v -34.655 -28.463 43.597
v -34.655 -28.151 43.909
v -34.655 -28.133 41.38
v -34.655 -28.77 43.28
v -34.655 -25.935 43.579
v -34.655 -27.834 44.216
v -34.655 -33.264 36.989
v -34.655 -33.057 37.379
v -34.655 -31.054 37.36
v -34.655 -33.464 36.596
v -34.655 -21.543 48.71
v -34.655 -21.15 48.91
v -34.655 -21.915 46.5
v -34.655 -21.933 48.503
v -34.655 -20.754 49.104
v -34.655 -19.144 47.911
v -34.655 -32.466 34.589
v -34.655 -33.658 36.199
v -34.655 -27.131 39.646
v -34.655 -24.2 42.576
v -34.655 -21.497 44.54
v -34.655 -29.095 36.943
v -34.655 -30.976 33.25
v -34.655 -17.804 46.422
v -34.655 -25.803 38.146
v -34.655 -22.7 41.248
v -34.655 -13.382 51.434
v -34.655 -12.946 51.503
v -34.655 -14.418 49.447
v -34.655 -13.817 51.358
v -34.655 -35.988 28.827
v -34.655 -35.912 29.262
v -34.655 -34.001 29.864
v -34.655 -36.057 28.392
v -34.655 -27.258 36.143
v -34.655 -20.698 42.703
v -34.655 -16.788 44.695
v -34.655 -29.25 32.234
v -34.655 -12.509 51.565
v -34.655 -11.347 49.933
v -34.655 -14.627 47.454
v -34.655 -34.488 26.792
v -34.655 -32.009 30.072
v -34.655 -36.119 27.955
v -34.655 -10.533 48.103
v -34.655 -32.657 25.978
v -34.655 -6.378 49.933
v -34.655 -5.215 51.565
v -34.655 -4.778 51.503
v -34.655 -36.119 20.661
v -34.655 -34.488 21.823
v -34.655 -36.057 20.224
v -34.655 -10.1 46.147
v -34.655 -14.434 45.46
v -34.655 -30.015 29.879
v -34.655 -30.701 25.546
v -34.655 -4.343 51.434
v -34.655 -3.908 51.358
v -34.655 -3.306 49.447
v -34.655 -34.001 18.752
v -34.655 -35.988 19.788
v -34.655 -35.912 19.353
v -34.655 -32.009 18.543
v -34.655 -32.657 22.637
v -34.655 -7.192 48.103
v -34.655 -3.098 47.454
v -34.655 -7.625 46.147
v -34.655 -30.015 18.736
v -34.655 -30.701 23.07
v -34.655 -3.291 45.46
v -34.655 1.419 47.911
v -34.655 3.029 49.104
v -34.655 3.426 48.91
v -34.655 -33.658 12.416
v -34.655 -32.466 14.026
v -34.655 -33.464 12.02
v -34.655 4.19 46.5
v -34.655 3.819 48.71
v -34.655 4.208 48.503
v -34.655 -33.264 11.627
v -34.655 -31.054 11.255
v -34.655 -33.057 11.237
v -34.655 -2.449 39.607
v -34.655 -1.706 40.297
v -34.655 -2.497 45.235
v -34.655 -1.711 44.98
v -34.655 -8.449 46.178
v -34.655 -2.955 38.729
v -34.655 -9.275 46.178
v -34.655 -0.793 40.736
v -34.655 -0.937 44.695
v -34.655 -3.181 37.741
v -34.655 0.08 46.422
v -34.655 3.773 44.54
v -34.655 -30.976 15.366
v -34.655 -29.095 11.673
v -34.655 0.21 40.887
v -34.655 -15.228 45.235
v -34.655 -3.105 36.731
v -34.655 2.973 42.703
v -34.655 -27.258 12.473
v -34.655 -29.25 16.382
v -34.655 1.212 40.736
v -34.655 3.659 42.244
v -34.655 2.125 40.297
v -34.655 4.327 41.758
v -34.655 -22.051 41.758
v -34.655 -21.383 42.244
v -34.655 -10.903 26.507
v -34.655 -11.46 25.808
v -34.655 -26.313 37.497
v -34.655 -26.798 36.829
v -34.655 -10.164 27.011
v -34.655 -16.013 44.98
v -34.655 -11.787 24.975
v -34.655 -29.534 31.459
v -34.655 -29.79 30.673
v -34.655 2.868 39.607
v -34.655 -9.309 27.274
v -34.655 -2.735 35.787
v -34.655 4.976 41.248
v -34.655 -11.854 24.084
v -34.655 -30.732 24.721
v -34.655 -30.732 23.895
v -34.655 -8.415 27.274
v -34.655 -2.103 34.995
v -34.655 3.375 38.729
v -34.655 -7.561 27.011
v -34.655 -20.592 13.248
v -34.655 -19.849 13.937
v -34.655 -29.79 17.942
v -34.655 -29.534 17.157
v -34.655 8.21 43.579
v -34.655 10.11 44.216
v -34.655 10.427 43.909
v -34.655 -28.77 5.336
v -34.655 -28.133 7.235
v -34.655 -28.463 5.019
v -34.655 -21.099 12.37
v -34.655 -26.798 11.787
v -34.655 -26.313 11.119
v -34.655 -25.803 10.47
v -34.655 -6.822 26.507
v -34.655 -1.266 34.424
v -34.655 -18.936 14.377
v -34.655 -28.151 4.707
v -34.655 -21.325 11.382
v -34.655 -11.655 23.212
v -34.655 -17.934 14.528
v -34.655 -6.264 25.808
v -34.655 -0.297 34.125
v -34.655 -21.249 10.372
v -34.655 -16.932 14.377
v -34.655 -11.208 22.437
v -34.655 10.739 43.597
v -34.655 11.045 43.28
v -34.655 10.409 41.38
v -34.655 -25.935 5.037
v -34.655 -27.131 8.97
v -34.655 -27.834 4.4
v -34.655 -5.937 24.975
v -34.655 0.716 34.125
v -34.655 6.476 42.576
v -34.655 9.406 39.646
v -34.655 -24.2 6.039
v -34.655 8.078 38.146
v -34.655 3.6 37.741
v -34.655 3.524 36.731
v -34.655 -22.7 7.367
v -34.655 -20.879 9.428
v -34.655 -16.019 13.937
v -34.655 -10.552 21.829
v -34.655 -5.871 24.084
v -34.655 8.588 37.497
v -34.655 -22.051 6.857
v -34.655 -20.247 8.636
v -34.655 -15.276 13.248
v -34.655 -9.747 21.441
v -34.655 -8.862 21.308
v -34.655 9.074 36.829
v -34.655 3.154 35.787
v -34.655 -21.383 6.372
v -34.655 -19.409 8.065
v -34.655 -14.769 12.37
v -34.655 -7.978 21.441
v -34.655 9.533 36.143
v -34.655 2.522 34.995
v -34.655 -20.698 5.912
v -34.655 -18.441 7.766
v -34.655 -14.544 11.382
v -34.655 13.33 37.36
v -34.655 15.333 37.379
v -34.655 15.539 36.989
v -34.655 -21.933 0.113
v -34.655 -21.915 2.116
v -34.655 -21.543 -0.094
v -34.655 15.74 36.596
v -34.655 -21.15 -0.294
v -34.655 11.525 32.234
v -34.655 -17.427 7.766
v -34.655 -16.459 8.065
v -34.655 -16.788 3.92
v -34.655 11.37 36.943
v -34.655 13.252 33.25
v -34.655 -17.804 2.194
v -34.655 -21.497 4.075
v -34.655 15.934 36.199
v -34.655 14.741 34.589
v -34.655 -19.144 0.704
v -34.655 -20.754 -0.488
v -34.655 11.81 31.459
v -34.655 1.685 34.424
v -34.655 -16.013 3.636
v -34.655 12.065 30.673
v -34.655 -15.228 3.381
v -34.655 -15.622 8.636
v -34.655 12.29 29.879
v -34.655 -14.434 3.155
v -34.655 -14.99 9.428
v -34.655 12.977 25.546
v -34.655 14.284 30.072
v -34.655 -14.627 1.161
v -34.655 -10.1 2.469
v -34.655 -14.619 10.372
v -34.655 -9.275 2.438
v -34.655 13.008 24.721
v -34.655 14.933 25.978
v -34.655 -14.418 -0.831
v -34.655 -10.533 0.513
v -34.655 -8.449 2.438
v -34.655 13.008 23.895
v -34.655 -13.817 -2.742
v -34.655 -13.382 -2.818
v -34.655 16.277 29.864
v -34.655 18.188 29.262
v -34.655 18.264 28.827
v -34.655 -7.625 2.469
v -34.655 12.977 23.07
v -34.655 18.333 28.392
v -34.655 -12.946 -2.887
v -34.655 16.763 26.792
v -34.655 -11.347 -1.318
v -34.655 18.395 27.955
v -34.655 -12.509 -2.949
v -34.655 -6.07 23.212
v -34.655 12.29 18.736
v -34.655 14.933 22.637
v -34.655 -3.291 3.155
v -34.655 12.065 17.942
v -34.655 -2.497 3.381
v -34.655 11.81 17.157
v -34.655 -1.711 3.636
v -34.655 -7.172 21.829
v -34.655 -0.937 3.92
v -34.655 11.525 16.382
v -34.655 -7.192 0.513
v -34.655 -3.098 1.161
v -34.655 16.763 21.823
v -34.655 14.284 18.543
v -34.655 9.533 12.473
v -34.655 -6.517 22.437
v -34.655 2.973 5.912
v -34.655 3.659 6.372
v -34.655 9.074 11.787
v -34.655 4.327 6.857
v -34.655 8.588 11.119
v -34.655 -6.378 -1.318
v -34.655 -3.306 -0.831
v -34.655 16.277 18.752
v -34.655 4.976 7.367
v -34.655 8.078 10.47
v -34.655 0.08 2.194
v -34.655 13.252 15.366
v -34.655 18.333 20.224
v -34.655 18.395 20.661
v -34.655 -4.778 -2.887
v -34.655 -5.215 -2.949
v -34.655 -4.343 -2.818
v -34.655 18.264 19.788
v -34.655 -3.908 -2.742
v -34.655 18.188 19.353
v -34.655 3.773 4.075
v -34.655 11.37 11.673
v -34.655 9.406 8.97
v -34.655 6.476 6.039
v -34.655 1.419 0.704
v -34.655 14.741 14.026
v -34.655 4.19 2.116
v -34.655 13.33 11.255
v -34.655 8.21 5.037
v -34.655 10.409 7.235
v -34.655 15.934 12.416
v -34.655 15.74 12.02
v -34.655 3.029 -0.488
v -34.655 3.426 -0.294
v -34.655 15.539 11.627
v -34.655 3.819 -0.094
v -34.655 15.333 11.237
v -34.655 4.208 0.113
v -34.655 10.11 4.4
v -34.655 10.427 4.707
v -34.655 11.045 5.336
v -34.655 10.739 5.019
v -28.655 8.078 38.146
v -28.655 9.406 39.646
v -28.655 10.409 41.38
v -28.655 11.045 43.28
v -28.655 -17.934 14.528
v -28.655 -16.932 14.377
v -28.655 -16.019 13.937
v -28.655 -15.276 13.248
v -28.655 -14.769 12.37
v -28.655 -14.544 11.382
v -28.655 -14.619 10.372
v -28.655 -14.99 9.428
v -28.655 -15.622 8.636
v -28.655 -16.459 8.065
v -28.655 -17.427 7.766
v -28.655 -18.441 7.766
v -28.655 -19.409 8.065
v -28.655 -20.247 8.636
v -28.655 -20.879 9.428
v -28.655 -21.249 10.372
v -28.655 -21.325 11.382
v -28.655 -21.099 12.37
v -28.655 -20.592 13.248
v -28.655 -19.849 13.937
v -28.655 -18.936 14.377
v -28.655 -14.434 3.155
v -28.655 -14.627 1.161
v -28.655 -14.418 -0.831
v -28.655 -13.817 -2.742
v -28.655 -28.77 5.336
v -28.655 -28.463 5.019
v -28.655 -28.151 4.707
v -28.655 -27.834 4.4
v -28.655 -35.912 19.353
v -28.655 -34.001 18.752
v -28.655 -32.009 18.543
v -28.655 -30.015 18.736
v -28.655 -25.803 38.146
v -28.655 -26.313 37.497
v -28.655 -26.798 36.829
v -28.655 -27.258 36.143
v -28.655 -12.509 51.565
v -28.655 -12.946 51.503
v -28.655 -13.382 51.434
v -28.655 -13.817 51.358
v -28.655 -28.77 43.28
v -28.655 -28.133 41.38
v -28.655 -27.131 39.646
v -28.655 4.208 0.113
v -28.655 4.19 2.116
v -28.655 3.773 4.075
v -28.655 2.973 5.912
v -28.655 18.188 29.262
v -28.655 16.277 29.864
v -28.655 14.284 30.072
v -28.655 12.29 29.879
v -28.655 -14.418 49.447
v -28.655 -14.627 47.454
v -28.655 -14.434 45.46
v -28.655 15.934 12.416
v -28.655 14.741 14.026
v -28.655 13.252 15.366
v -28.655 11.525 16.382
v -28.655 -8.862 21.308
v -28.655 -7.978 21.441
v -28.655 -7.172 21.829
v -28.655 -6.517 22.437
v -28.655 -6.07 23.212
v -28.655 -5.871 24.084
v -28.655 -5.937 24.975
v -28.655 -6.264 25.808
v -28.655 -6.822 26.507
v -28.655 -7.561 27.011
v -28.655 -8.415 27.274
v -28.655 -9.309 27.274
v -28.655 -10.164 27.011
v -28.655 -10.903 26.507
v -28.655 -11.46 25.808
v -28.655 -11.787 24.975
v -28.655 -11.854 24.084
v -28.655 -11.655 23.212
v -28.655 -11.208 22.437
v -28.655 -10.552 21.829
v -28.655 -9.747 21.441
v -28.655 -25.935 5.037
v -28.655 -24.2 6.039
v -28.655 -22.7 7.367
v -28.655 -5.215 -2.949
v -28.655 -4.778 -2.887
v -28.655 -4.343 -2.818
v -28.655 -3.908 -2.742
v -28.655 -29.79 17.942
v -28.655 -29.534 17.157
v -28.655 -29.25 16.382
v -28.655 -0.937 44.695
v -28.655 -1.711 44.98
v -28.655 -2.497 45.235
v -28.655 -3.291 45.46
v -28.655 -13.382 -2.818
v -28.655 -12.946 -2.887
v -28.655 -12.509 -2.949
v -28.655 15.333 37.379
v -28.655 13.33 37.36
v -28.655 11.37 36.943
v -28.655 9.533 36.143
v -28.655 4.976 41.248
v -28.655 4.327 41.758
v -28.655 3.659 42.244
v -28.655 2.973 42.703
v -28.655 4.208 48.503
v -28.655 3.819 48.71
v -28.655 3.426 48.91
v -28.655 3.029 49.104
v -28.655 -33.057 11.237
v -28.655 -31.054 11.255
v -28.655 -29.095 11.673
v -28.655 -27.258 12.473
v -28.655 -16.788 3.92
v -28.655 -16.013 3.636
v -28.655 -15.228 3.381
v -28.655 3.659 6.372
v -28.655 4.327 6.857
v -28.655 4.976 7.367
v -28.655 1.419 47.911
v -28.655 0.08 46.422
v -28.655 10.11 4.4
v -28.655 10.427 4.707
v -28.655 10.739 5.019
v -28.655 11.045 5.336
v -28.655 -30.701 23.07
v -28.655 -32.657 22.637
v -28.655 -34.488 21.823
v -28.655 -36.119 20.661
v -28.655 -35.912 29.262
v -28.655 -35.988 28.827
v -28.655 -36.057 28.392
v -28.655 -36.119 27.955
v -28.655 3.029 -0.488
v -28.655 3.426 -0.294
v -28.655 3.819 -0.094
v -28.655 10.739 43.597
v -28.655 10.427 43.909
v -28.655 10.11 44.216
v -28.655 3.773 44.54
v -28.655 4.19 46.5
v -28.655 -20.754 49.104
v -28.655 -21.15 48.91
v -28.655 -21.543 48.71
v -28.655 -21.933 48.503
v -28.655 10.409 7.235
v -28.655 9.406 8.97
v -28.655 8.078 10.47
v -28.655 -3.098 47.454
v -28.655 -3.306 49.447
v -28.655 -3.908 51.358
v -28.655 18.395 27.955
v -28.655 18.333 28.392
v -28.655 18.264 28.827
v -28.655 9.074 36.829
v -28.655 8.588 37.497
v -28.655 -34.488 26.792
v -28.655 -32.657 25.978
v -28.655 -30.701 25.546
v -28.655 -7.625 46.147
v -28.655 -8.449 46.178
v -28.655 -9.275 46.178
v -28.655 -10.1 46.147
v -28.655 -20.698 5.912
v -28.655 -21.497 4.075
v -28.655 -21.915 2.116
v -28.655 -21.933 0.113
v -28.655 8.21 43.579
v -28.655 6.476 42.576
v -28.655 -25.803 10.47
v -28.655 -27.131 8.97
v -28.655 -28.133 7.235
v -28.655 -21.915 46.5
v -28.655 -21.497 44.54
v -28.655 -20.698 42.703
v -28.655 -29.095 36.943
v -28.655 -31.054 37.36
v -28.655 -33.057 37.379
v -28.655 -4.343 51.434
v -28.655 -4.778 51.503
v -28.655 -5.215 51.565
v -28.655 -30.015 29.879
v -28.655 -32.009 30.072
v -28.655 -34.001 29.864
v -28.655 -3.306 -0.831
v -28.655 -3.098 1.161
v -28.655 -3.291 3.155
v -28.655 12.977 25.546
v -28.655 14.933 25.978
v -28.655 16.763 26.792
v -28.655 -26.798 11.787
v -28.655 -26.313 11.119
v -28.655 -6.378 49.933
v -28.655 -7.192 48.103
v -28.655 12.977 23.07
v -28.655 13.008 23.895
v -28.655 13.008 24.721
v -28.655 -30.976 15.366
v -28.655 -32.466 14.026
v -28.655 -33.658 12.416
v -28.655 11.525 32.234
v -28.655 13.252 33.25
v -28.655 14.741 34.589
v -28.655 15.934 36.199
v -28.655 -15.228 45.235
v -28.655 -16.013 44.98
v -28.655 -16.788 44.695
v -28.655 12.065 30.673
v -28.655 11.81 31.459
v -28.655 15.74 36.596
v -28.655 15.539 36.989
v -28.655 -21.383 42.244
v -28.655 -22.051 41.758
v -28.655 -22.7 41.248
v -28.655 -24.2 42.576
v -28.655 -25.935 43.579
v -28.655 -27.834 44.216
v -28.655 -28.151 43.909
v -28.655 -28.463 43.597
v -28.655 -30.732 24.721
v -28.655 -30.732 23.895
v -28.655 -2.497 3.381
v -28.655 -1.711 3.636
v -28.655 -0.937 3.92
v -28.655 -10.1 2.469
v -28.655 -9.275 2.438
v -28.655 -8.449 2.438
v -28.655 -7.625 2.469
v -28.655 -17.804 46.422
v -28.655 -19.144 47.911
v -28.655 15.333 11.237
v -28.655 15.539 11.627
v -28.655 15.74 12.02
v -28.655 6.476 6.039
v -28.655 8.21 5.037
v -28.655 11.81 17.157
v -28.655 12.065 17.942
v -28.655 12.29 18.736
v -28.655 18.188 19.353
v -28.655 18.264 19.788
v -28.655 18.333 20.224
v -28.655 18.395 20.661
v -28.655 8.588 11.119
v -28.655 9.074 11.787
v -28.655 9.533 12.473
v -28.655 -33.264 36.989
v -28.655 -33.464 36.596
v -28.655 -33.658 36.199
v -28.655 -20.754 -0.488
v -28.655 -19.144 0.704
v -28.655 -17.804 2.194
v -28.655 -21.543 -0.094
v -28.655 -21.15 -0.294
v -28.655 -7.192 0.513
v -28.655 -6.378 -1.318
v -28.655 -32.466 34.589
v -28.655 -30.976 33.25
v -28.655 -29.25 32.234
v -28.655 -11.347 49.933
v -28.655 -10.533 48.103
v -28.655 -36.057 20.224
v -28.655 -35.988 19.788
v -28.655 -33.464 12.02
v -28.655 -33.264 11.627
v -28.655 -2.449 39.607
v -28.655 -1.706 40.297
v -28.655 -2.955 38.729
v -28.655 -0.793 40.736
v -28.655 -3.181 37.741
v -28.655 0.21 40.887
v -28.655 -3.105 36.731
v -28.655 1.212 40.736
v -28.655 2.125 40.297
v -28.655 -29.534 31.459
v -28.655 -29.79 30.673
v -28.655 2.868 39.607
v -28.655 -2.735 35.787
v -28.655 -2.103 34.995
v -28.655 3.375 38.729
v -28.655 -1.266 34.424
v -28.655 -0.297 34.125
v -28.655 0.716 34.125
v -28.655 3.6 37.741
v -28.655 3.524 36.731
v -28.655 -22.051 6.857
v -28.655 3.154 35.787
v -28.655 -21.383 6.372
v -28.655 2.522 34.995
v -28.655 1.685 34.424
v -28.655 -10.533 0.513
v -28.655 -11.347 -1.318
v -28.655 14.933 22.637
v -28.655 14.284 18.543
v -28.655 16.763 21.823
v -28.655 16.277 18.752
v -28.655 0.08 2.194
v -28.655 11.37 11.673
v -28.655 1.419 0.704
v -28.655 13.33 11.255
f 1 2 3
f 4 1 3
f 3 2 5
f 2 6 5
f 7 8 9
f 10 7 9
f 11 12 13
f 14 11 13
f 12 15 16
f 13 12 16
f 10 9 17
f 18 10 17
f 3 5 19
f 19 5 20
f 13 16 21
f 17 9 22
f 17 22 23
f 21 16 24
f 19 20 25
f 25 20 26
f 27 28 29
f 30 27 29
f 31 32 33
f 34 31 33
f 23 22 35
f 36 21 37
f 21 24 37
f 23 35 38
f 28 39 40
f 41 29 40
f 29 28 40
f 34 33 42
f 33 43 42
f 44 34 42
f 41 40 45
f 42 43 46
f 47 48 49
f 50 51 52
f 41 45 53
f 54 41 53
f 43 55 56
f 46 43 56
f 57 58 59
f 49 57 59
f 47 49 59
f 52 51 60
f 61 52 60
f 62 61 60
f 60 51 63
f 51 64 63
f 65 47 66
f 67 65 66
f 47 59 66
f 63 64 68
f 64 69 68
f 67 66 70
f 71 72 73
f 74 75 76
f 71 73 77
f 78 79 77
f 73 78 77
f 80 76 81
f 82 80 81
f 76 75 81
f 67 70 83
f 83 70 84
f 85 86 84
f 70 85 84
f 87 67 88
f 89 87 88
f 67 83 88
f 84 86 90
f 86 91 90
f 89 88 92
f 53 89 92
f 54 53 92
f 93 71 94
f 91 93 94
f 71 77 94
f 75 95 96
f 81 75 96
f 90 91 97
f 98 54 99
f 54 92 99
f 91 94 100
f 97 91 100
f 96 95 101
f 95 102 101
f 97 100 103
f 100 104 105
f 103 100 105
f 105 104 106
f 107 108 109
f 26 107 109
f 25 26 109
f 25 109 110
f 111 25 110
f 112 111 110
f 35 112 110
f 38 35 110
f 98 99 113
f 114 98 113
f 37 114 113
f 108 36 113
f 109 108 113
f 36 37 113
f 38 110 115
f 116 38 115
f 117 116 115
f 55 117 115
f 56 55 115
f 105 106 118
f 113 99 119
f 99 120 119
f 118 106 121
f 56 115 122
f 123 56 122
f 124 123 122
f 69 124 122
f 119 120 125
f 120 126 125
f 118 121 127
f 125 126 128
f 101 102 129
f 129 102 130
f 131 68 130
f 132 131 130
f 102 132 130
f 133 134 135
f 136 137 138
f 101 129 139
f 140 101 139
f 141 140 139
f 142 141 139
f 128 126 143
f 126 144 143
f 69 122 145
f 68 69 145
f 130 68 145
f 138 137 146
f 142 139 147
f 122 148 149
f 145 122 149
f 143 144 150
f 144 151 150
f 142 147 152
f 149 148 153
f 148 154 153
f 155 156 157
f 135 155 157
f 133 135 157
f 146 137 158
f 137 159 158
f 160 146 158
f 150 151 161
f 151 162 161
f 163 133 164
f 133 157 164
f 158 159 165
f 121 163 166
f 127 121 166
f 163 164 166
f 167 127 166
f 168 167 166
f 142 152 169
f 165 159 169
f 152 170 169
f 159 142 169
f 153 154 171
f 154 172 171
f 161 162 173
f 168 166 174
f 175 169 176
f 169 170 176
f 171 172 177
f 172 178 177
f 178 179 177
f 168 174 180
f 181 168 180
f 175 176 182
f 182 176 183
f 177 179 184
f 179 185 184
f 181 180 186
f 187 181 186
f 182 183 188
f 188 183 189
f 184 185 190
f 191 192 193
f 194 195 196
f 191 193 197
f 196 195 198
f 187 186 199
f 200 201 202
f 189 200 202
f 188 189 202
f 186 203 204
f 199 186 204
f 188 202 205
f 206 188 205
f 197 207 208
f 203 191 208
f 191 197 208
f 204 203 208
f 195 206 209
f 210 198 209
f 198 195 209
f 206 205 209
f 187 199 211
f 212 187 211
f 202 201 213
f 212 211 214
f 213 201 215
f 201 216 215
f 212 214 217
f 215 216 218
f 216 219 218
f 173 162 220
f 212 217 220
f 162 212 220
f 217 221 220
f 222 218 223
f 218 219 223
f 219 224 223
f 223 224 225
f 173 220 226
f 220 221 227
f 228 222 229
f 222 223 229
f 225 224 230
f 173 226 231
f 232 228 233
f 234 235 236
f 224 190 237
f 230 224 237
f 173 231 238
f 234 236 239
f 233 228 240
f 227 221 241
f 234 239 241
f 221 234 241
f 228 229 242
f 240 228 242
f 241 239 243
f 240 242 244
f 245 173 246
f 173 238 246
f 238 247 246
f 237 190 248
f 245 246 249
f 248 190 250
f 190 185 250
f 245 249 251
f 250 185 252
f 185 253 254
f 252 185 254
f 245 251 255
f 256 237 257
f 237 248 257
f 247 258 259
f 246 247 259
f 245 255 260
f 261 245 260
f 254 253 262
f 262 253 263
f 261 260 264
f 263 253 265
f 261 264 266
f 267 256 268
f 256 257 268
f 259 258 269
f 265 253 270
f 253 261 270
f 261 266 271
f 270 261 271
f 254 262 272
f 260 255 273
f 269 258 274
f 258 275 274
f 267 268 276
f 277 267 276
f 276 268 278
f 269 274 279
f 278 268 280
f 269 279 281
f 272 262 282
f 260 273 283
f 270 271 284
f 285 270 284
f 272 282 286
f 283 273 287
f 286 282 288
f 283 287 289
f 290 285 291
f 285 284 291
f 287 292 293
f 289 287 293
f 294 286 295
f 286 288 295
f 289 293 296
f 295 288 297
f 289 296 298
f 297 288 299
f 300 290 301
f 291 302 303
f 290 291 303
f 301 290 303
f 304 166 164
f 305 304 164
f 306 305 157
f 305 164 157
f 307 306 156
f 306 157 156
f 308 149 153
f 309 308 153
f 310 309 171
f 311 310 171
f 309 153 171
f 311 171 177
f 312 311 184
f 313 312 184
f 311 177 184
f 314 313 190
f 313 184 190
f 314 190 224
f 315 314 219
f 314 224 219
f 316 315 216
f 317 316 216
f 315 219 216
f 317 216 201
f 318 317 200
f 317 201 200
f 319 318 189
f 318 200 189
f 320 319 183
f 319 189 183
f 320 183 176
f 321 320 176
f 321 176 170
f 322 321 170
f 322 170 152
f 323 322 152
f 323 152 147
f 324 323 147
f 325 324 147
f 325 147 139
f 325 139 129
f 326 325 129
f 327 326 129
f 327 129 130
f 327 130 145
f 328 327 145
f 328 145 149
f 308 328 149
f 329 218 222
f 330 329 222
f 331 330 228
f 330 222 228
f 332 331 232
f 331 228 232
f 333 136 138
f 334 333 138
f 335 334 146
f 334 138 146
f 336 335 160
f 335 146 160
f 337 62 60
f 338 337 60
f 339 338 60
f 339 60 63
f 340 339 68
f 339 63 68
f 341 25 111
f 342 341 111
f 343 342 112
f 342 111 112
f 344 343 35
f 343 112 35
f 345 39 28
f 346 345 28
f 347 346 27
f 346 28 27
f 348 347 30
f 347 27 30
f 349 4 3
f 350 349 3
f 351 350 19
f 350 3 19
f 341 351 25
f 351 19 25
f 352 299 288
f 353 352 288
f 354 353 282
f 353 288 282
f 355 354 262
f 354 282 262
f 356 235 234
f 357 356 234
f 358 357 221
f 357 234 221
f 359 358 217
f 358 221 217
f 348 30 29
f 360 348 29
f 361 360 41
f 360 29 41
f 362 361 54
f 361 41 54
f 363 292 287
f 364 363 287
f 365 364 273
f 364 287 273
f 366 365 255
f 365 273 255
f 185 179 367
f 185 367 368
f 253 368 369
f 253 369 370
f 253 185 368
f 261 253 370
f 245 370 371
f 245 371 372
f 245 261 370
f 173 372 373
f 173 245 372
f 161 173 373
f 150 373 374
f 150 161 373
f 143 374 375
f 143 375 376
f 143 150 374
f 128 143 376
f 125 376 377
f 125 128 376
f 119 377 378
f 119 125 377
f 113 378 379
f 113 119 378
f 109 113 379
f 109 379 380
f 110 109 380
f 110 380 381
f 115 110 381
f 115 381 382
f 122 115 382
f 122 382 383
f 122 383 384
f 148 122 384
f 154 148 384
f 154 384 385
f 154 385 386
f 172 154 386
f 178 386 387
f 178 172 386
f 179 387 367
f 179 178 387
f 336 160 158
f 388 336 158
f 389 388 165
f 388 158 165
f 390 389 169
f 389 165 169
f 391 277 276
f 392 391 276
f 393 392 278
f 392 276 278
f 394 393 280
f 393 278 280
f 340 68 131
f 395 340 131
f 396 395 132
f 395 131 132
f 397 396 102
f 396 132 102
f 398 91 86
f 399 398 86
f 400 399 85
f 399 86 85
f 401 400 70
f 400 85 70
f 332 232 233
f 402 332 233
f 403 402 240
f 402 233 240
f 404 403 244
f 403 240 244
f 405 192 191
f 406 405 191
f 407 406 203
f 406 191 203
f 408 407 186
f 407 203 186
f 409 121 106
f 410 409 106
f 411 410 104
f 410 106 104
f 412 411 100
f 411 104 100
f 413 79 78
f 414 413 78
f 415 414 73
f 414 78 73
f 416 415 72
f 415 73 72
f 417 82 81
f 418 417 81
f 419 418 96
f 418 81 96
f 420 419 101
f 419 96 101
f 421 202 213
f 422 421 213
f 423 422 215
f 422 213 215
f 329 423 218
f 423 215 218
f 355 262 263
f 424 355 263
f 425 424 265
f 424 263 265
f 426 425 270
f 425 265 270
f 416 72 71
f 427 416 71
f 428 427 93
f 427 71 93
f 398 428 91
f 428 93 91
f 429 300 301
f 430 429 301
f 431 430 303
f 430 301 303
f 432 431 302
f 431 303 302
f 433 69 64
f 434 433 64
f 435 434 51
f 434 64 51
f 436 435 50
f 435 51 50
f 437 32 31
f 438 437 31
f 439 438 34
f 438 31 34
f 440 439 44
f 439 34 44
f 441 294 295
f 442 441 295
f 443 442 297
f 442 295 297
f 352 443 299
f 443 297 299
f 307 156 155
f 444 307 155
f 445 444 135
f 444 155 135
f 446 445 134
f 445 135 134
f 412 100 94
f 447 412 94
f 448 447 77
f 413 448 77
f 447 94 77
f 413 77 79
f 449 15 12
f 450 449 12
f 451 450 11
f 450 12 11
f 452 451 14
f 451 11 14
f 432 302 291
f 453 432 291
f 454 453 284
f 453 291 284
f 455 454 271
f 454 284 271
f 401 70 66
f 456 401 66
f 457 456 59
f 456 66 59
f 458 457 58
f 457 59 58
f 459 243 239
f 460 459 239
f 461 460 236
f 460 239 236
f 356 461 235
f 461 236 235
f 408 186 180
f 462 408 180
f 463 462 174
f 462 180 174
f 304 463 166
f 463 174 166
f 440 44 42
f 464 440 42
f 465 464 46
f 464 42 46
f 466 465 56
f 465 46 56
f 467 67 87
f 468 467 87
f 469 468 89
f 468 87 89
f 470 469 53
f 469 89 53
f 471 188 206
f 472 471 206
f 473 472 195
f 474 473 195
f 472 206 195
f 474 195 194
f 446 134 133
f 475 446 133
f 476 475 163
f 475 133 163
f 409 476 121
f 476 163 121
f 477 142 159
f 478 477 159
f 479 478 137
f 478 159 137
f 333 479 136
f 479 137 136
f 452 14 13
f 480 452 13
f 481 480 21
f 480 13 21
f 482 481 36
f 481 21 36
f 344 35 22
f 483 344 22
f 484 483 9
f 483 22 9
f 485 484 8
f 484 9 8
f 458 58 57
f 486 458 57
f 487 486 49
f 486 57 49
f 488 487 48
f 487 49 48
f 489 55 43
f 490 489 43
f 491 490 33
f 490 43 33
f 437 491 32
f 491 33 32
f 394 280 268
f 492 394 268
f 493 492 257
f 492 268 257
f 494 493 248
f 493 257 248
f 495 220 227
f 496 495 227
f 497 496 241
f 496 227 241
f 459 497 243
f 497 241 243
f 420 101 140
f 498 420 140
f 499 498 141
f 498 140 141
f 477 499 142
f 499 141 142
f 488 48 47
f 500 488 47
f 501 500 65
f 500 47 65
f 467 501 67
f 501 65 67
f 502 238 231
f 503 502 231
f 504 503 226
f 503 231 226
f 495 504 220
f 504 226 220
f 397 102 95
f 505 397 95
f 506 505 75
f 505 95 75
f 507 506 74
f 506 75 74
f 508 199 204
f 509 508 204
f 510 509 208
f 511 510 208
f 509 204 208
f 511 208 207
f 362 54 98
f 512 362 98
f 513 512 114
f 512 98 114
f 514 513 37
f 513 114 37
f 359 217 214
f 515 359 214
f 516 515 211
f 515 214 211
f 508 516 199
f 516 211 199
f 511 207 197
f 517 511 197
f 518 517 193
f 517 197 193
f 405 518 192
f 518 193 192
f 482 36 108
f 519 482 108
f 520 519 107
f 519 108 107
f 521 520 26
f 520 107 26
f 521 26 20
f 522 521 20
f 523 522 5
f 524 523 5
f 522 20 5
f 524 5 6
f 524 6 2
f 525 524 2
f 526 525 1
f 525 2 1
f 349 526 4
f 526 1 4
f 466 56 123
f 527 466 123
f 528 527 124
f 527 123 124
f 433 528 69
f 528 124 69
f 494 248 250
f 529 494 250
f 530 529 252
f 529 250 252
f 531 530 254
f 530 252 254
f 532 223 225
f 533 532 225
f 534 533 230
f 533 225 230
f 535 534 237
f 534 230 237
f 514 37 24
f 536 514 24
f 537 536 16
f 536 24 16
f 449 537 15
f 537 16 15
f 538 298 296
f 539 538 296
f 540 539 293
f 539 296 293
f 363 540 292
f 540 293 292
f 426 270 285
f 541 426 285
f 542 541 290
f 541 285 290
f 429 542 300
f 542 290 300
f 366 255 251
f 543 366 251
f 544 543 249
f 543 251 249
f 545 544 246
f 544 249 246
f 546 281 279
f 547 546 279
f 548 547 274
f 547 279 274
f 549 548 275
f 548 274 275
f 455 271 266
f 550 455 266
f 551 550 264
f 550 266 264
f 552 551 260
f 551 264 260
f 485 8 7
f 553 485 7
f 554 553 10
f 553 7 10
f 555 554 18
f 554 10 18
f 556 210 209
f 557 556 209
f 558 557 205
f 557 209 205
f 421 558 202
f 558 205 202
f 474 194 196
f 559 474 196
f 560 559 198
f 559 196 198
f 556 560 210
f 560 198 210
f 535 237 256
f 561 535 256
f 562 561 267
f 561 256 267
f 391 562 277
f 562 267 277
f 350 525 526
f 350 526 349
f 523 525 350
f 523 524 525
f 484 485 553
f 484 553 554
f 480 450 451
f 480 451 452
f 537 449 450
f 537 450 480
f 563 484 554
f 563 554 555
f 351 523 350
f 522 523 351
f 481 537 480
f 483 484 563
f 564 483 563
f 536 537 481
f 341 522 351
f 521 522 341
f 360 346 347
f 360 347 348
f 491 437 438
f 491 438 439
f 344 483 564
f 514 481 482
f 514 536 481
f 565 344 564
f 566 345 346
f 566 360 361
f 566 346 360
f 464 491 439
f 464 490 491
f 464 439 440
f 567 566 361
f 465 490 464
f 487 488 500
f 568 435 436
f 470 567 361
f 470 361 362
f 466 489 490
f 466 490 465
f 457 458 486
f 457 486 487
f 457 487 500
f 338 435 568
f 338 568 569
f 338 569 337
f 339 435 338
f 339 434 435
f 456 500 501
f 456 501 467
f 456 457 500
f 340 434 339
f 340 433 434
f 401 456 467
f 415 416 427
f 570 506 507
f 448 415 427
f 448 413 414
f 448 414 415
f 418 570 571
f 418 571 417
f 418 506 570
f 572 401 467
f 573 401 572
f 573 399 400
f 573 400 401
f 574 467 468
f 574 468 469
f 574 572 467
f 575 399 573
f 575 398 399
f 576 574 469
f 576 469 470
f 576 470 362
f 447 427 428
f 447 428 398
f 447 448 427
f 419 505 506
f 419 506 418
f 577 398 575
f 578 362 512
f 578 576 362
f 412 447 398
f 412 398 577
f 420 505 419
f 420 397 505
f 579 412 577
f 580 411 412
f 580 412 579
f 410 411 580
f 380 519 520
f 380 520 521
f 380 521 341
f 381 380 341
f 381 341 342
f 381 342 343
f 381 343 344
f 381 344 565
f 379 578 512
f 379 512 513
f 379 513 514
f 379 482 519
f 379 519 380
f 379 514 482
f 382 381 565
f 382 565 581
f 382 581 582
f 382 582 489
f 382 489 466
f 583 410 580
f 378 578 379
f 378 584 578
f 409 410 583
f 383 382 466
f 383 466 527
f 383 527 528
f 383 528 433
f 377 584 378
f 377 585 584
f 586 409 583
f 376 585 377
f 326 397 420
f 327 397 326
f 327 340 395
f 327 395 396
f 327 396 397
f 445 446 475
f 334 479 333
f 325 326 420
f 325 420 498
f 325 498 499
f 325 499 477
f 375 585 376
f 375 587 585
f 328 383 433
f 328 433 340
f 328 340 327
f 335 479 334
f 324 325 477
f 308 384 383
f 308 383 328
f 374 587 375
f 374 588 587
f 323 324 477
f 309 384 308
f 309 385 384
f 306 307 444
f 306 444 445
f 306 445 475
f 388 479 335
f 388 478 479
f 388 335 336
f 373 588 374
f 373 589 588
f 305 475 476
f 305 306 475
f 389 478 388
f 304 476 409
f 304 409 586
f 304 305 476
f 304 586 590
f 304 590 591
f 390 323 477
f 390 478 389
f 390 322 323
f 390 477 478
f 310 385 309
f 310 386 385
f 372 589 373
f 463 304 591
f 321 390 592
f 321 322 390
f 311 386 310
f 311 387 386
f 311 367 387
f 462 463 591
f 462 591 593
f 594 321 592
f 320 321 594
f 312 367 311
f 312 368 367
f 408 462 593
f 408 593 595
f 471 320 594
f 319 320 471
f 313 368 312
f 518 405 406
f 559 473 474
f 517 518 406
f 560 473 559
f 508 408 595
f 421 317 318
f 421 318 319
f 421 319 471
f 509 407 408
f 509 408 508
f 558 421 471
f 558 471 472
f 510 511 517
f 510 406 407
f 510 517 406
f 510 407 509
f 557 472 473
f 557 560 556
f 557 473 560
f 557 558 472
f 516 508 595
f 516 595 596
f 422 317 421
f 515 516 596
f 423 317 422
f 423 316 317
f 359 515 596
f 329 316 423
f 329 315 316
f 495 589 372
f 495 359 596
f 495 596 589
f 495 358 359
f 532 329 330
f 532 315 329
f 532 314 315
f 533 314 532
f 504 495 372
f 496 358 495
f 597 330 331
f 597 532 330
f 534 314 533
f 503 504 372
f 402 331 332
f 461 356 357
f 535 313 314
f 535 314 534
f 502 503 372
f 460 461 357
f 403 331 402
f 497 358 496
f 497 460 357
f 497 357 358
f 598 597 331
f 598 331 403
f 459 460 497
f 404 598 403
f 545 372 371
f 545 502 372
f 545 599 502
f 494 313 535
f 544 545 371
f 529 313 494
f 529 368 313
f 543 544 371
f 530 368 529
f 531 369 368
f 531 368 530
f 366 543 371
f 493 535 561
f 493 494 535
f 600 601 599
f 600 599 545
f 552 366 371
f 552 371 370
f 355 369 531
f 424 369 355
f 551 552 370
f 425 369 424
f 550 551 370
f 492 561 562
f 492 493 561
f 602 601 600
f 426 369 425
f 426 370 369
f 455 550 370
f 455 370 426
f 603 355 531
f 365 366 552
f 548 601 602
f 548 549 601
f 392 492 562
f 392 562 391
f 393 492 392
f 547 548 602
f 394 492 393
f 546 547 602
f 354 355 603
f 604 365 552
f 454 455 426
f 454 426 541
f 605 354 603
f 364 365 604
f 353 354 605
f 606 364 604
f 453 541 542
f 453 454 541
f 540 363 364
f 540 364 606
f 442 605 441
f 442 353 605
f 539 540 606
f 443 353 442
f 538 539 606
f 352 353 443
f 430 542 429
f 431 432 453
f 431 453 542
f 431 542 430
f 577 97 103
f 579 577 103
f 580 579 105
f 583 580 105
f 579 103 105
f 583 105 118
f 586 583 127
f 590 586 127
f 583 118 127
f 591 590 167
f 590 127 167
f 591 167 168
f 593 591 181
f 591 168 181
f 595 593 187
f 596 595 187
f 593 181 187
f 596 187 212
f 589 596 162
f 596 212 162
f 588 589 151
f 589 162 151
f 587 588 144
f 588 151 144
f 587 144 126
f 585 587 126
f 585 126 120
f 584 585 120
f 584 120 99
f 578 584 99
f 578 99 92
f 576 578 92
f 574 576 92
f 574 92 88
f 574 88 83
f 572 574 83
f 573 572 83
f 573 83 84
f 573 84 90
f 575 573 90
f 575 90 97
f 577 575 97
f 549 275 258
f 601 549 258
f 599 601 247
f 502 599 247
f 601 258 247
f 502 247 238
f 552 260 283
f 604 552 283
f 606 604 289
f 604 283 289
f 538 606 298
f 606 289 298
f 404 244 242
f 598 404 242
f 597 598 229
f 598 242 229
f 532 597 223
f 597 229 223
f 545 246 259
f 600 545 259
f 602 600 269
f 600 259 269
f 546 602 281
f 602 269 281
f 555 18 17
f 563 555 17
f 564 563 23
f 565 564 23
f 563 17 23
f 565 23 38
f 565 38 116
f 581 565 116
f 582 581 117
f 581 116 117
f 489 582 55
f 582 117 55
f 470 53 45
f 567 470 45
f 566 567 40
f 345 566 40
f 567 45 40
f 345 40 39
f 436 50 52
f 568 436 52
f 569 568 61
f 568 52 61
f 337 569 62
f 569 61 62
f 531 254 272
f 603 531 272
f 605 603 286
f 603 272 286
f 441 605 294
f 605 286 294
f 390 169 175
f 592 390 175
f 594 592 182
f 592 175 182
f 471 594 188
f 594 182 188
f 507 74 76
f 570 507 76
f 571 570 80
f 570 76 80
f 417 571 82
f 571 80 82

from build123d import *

# Parameters (mm, degrees)
SPUR_START             = -34.654843931
SPUR_GEAR_AM_OUTLINE_R = 5
SPUR_GEAR_AM_DEPTH     = 6
BOSS_EXTRUDE1_START    = -6
SKETCH2_R              = 5
SKETCH2_R_2            = 3
BOSS_EXTRUDE1_DEPTH    = 6
CUT_EXTRUDE1_REACH     = 65.242
SKETCH3_R              = 3.4


# Read off the part's stored shape, not the designer's step: spur gear_am
with BuildPart() as part:
    # spur gear_am outline → spur gear_am (new body)
    with BuildSketch(Plane.YZ.offset(SPUR_START)):
        with BuildLine():
            ThreePointArc((-3.907949552, 51.357822977), (-4.560317936, 51.46921073), (-5.215177847, 51.564867598))
            ThreePointArc((-5.215177847, 51.564867598), (-6.830693003, 49.038493172), (-7.624540457, 46.146735372))
            ThreePointArc((-7.624540457, 46.146735372), (-8.862265725, 46.181781364), (-10.099990992, 46.146735372))
            ThreePointArc((-10.099990992, 46.146735372), (-10.893838446, 49.038493172), (-12.509353602, 51.564867598))
            ThreePointArc((-12.509353602, 51.564867598), (-13.164213513, 51.46921073), (-13.816581897, 51.357822977))
            ThreePointArc((-13.816581897, 51.357822977), (-14.572335481, 48.455876478), (-14.433726972, 45.460339024))
            ThreePointArc((-14.433726972, 45.460339024), (-15.62170346, 45.111191601), (-16.788020333, 44.69538274))
            ThreePointArc((-16.788020333, 44.69538274), (-18.436616432, 47.200295486), (-20.75375528, 49.103798708))
            ThreePointArc((-20.75375528, 49.103798708), (-21.347004468, 48.810460779), (-21.933022961, 48.502931813))
            ThreePointArc((-21.933022961, 48.502931813), (-21.755036547, 45.509475985), (-20.69754004, 42.703382954))
            ThreePointArc((-20.69754004, 42.703382954), (-21.719480333, 42.004219099), (-22.700221591, 41.248349637))
            ThreePointArc((-22.700221591, 41.248349637), (-25.042190262, 43.121219015), (-27.834135107, 44.215522876))
            ThreePointArc((-27.834135107, 44.215522876), (-28.307702207, 43.753217846), (-28.770007237, 43.279650746))
            ThreePointArc((-28.770007237, 43.279650746), (-27.675703376, 40.487705901), (-25.802833998, 38.145737231))
            ThreePointArc((-25.802833998, 38.145737231), (-26.558703459, 37.164995972), (-27.257867315, 36.143055679))
            ThreePointArc((-27.257867315, 36.143055679), (-30.063960346, 37.200552186), (-33.057416174, 37.3785386))
            ThreePointArc((-33.057416174, 37.3785386), (-33.36494514, 36.792520107), (-33.658283069, 36.199270919))
            ThreePointArc((-33.658283069, 36.199270919), (-31.754779846, 33.882132071), (-29.249867101, 32.233535972))
            ThreePointArc((-29.249867101, 32.233535972), (-29.665675962, 31.067219099), (-30.014823385, 29.879242611))
            ThreePointArc((-30.014823385, 29.879242611), (-33.010360839, 30.01785112), (-35.912307338, 29.262097536))
            ThreePointArc((-35.912307338, 29.262097536), (-36.023695091, 28.609729152), (-36.119351959, 27.954869241))
            ThreePointArc((-36.119351959, 27.954869241), (-33.592977533, 26.339354085), (-30.701219732, 25.545506631))
            ThreePointArc((-30.701219732, 25.545506631), (-30.736265724, 24.307781363), (-30.701219732, 23.070056096))
            ThreePointArc((-30.701219732, 23.070056096), (-33.592977533, 22.276208642), (-36.119351959, 20.660693486))
            ThreePointArc((-36.119351959, 20.660693486), (-36.023695091, 20.005833575), (-35.912307338, 19.353465191))
            ThreePointArc((-35.912307338, 19.353465191), (-33.010360839, 18.597711607), (-30.014823385, 18.736320117))
            ThreePointArc((-30.014823385, 18.736320117), (-29.665675962, 17.548343629), (-29.249867101, 16.382026755))
            ThreePointArc((-29.249867101, 16.382026755), (-31.754779846, 14.733430656), (-33.658283069, 12.416291808))
            ThreePointArc((-33.658283069, 12.416291808), (-33.36494514, 11.82304262), (-33.057416174, 11.237024127))
            ThreePointArc((-33.057416174, 11.237024127), (-30.063960346, 11.415010541), (-27.257867315, 12.472507048))
            ThreePointArc((-27.257867315, 12.472507048), (-26.558703459, 11.450566755), (-25.802833998, 10.469825497))
            ThreePointArc((-25.802833998, 10.469825497), (-27.675703376, 8.127856826), (-28.770007237, 5.335911981))
            ThreePointArc((-28.770007237, 5.335911981), (-28.307702207, 4.862344881), (-27.834135107, 4.400039851))
            ThreePointArc((-27.834135107, 4.400039851), (-25.042190262, 5.494343712), (-22.700221591, 7.36721309))
            ThreePointArc((-22.700221591, 7.36721309), (-21.719480333, 6.611343629), (-20.69754004, 5.912179773))
            ThreePointArc((-20.69754004, 5.912179773), (-21.755036547, 3.106086742), (-21.933022961, 0.112630914))
            ThreePointArc((-21.933022961, 0.112630914), (-21.347004468, -0.194898052), (-20.75375528, -0.488235981))
            ThreePointArc((-20.75375528, -0.488235981), (-18.436616432, 1.415267242), (-16.788020333, 3.920179987))
            ThreePointArc((-16.788020333, 3.920179987), (-15.62170346, 3.504371126), (-14.433726972, 3.155223703))
            ThreePointArc((-14.433726972, 3.155223703), (-14.572335481, 0.159686249), (-13.816581897, -2.742260249))
            ThreePointArc((-13.816581897, -2.742260249), (-13.164213513, -2.853648003), (-12.509353602, -2.949304871))
            ThreePointArc((-12.509353602, -2.949304871), (-10.893838446, -0.422930445), (-10.099990992, 2.468827356))
            ThreePointArc((-10.099990992, 2.468827356), (-8.862265725, 2.433781364), (-7.624540457, 2.468827356))
            ThreePointArc((-7.624540457, 2.468827356), (-6.830693003, -0.422930445), (-5.215177847, -2.949304871))
            ThreePointArc((-5.215177847, -2.949304871), (-4.560317936, -2.853648003), (-3.907949552, -2.742260249))
            ThreePointArc((-3.907949552, -2.742260249), (-3.152195968, 0.159686249), (-3.290804477, 3.155223703))
            ThreePointArc((-3.290804477, 3.155223703), (-2.102827989, 3.504371126), (-0.936511116, 3.920179987))
            ThreePointArc((-0.936511116, 3.920179987), (0.712084983, 1.415267242), (3.029223831, -0.488235981))
            ThreePointArc((3.029223831, -0.488235981), (3.622473019, -0.194898052), (4.208491512, 0.112630914))
            ThreePointArc((4.208491512, 0.112630914), (4.030505098, 3.106086742), (2.973008591, 5.912179773))
            ThreePointArc((2.973008591, 5.912179773), (3.994948884, 6.611343629), (4.975690142, 7.36721309))
            ThreePointArc((4.975690142, 7.36721309), (7.317658813, 5.494343712), (10.109603658, 4.400039851))
            ThreePointArc((10.109603658, 4.400039851), (10.583170758, 4.862344881), (11.045475788, 5.335911981))
            ThreePointArc((11.045475788, 5.335911981), (9.951171927, 8.127856826), (8.078302549, 10.469825497))
            ThreePointArc((8.078302549, 10.469825497), (8.83417201, 11.450566755), (9.533335866, 12.472507048))
            ThreePointArc((9.533335866, 12.472507048), (12.339428897, 11.415010541), (15.332884725, 11.237024127))
            ThreePointArc((15.332884725, 11.237024127), (15.640413691, 11.82304262), (15.93375162, 12.416291808))
            ThreePointArc((15.93375162, 12.416291808), (14.030248397, 14.733430656), (11.525335652, 16.382026755))
            ThreePointArc((11.525335652, 16.382026755), (11.941144513, 17.548343629), (12.290291936, 18.736320117))
            ThreePointArc((12.290291936, 18.736320117), (15.28582939, 18.597711607), (18.187775889, 19.353465191))
            ThreePointArc((18.187775889, 19.353465191), (18.299163642, 20.005833575), (18.39482051, 20.660693486))
            ThreePointArc((18.39482051, 20.660693486), (15.868446084, 22.276208642), (12.976688283, 23.070056096))
            ThreePointArc((12.976688283, 23.070056096), (13.011734276, 24.307781363), (12.976688283, 25.545506631))
            ThreePointArc((12.976688283, 25.545506631), (15.868446084, 26.339354085), (18.39482051, 27.954869241))
            ThreePointArc((18.39482051, 27.954869241), (18.299163642, 28.609729152), (18.187775889, 29.262097536))
            ThreePointArc((18.187775889, 29.262097536), (15.28582939, 30.01785112), (12.290291936, 29.879242611))
            ThreePointArc((12.290291936, 29.879242611), (11.941144513, 31.067219099), (11.525335652, 32.233535972))
            ThreePointArc((11.525335652, 32.233535972), (14.030248397, 33.882132071), (15.93375162, 36.199270919))
            ThreePointArc((15.93375162, 36.199270919), (15.640413691, 36.792520107), (15.332884725, 37.3785386))
            ThreePointArc((15.332884725, 37.3785386), (12.339428897, 37.200552186), (9.533335866, 36.143055679))
            ThreePointArc((9.533335866, 36.143055679), (8.83417201, 37.164995972), (8.078302549, 38.145737231))
            ThreePointArc((8.078302549, 38.145737231), (9.951171927, 40.487705901), (11.045475788, 43.279650746))
            ThreePointArc((11.045475788, 43.279650746), (10.583170758, 43.753217846), (10.109603658, 44.215522876))
            ThreePointArc((10.109603658, 44.215522876), (7.317658813, 43.121219015), (4.975690142, 41.248349637))
            ThreePointArc((4.975690142, 41.248349637), (3.994948884, 42.004219099), (2.973008591, 42.703382954))
            ThreePointArc((2.973008591, 42.703382954), (4.030505098, 45.509475985), (4.208491512, 48.502931813))
            ThreePointArc((4.208491512, 48.502931813), (3.622473019, 48.810460779), (3.029223831, 49.103798708))
            ThreePointArc((3.029223831, 49.103798708), (0.712084983, 47.200295486), (-0.936511116, 44.69538274))
            ThreePointArc((-0.936511116, 44.69538274), (-2.102827989, 45.111191601), (-3.290804477, 45.460339024))
            ThreePointArc((-3.290804477, 45.460339024), (-3.152195968, 48.455876478), (-3.907949552, 51.357822977))
        make_face()
        with Locations((-8.862265724, 24.307781364)):
            Circle(SPUR_GEAR_AM_OUTLINE_R, mode=Mode.SUBTRACT)
    extrude(amount=SPUR_GEAR_AM_DEPTH)

    # Sketch2 → Boss-Extrude1 (add)
    with BuildSketch(Plane(origin=(-28.654843931, 0, 0), x_dir=(0, 0, -1), z_dir=(1, 0, 0)).offset(BOSS_EXTRUDE1_START)):
        with Locations((-24.307781364, -8.862265724)):
            Circle(SKETCH2_R)
        with Locations((-24.307781364, -8.862265724)):
            Circle(SKETCH2_R_2, mode=Mode.SUBTRACT)
    extrude(amount=BOSS_EXTRUDE1_DEPTH)

    # Sketch3 → Cut-Extrude1 (cut, up to next)
    with BuildSketch(Plane.ZY.offset(34.654843931), mode=Mode.PRIVATE) as cut_extrude1_sk1:
        with Locations((37.487332659, 0.209637475)):
            Circle(SKETCH3_R)
    cut_extrude1_tool1 = extrude(cut_extrude1_sk1.sketch, amount=-CUT_EXTRUDE1_REACH, mode=Mode.PRIVATE) & part.part
    # Sketch3 → Cut-Extrude1 (cut, up to next)
    with BuildSketch(Plane.ZY.offset(34.654843931), mode=Mode.PRIVATE) as cut_extrude1_sk2:
        with Locations((11.128230068, -17.934168924)):
            Circle(SKETCH3_R)
    cut_extrude1_tool2 = extrude(cut_extrude1_sk2.sketch, amount=-CUT_EXTRUDE1_REACH, mode=Mode.PRIVATE) & part.part
    add(cut_extrude1_tool1.solids().sort_by_distance((-34.654844, 0.209637, 37.487333))[0], mode=Mode.SUBTRACT)
    add(cut_extrude1_tool2.solids().sort_by_distance((-34.654844, -17.934169, 11.12823))[0], mode=Mode.SUBTRACT)


solid = part.part
